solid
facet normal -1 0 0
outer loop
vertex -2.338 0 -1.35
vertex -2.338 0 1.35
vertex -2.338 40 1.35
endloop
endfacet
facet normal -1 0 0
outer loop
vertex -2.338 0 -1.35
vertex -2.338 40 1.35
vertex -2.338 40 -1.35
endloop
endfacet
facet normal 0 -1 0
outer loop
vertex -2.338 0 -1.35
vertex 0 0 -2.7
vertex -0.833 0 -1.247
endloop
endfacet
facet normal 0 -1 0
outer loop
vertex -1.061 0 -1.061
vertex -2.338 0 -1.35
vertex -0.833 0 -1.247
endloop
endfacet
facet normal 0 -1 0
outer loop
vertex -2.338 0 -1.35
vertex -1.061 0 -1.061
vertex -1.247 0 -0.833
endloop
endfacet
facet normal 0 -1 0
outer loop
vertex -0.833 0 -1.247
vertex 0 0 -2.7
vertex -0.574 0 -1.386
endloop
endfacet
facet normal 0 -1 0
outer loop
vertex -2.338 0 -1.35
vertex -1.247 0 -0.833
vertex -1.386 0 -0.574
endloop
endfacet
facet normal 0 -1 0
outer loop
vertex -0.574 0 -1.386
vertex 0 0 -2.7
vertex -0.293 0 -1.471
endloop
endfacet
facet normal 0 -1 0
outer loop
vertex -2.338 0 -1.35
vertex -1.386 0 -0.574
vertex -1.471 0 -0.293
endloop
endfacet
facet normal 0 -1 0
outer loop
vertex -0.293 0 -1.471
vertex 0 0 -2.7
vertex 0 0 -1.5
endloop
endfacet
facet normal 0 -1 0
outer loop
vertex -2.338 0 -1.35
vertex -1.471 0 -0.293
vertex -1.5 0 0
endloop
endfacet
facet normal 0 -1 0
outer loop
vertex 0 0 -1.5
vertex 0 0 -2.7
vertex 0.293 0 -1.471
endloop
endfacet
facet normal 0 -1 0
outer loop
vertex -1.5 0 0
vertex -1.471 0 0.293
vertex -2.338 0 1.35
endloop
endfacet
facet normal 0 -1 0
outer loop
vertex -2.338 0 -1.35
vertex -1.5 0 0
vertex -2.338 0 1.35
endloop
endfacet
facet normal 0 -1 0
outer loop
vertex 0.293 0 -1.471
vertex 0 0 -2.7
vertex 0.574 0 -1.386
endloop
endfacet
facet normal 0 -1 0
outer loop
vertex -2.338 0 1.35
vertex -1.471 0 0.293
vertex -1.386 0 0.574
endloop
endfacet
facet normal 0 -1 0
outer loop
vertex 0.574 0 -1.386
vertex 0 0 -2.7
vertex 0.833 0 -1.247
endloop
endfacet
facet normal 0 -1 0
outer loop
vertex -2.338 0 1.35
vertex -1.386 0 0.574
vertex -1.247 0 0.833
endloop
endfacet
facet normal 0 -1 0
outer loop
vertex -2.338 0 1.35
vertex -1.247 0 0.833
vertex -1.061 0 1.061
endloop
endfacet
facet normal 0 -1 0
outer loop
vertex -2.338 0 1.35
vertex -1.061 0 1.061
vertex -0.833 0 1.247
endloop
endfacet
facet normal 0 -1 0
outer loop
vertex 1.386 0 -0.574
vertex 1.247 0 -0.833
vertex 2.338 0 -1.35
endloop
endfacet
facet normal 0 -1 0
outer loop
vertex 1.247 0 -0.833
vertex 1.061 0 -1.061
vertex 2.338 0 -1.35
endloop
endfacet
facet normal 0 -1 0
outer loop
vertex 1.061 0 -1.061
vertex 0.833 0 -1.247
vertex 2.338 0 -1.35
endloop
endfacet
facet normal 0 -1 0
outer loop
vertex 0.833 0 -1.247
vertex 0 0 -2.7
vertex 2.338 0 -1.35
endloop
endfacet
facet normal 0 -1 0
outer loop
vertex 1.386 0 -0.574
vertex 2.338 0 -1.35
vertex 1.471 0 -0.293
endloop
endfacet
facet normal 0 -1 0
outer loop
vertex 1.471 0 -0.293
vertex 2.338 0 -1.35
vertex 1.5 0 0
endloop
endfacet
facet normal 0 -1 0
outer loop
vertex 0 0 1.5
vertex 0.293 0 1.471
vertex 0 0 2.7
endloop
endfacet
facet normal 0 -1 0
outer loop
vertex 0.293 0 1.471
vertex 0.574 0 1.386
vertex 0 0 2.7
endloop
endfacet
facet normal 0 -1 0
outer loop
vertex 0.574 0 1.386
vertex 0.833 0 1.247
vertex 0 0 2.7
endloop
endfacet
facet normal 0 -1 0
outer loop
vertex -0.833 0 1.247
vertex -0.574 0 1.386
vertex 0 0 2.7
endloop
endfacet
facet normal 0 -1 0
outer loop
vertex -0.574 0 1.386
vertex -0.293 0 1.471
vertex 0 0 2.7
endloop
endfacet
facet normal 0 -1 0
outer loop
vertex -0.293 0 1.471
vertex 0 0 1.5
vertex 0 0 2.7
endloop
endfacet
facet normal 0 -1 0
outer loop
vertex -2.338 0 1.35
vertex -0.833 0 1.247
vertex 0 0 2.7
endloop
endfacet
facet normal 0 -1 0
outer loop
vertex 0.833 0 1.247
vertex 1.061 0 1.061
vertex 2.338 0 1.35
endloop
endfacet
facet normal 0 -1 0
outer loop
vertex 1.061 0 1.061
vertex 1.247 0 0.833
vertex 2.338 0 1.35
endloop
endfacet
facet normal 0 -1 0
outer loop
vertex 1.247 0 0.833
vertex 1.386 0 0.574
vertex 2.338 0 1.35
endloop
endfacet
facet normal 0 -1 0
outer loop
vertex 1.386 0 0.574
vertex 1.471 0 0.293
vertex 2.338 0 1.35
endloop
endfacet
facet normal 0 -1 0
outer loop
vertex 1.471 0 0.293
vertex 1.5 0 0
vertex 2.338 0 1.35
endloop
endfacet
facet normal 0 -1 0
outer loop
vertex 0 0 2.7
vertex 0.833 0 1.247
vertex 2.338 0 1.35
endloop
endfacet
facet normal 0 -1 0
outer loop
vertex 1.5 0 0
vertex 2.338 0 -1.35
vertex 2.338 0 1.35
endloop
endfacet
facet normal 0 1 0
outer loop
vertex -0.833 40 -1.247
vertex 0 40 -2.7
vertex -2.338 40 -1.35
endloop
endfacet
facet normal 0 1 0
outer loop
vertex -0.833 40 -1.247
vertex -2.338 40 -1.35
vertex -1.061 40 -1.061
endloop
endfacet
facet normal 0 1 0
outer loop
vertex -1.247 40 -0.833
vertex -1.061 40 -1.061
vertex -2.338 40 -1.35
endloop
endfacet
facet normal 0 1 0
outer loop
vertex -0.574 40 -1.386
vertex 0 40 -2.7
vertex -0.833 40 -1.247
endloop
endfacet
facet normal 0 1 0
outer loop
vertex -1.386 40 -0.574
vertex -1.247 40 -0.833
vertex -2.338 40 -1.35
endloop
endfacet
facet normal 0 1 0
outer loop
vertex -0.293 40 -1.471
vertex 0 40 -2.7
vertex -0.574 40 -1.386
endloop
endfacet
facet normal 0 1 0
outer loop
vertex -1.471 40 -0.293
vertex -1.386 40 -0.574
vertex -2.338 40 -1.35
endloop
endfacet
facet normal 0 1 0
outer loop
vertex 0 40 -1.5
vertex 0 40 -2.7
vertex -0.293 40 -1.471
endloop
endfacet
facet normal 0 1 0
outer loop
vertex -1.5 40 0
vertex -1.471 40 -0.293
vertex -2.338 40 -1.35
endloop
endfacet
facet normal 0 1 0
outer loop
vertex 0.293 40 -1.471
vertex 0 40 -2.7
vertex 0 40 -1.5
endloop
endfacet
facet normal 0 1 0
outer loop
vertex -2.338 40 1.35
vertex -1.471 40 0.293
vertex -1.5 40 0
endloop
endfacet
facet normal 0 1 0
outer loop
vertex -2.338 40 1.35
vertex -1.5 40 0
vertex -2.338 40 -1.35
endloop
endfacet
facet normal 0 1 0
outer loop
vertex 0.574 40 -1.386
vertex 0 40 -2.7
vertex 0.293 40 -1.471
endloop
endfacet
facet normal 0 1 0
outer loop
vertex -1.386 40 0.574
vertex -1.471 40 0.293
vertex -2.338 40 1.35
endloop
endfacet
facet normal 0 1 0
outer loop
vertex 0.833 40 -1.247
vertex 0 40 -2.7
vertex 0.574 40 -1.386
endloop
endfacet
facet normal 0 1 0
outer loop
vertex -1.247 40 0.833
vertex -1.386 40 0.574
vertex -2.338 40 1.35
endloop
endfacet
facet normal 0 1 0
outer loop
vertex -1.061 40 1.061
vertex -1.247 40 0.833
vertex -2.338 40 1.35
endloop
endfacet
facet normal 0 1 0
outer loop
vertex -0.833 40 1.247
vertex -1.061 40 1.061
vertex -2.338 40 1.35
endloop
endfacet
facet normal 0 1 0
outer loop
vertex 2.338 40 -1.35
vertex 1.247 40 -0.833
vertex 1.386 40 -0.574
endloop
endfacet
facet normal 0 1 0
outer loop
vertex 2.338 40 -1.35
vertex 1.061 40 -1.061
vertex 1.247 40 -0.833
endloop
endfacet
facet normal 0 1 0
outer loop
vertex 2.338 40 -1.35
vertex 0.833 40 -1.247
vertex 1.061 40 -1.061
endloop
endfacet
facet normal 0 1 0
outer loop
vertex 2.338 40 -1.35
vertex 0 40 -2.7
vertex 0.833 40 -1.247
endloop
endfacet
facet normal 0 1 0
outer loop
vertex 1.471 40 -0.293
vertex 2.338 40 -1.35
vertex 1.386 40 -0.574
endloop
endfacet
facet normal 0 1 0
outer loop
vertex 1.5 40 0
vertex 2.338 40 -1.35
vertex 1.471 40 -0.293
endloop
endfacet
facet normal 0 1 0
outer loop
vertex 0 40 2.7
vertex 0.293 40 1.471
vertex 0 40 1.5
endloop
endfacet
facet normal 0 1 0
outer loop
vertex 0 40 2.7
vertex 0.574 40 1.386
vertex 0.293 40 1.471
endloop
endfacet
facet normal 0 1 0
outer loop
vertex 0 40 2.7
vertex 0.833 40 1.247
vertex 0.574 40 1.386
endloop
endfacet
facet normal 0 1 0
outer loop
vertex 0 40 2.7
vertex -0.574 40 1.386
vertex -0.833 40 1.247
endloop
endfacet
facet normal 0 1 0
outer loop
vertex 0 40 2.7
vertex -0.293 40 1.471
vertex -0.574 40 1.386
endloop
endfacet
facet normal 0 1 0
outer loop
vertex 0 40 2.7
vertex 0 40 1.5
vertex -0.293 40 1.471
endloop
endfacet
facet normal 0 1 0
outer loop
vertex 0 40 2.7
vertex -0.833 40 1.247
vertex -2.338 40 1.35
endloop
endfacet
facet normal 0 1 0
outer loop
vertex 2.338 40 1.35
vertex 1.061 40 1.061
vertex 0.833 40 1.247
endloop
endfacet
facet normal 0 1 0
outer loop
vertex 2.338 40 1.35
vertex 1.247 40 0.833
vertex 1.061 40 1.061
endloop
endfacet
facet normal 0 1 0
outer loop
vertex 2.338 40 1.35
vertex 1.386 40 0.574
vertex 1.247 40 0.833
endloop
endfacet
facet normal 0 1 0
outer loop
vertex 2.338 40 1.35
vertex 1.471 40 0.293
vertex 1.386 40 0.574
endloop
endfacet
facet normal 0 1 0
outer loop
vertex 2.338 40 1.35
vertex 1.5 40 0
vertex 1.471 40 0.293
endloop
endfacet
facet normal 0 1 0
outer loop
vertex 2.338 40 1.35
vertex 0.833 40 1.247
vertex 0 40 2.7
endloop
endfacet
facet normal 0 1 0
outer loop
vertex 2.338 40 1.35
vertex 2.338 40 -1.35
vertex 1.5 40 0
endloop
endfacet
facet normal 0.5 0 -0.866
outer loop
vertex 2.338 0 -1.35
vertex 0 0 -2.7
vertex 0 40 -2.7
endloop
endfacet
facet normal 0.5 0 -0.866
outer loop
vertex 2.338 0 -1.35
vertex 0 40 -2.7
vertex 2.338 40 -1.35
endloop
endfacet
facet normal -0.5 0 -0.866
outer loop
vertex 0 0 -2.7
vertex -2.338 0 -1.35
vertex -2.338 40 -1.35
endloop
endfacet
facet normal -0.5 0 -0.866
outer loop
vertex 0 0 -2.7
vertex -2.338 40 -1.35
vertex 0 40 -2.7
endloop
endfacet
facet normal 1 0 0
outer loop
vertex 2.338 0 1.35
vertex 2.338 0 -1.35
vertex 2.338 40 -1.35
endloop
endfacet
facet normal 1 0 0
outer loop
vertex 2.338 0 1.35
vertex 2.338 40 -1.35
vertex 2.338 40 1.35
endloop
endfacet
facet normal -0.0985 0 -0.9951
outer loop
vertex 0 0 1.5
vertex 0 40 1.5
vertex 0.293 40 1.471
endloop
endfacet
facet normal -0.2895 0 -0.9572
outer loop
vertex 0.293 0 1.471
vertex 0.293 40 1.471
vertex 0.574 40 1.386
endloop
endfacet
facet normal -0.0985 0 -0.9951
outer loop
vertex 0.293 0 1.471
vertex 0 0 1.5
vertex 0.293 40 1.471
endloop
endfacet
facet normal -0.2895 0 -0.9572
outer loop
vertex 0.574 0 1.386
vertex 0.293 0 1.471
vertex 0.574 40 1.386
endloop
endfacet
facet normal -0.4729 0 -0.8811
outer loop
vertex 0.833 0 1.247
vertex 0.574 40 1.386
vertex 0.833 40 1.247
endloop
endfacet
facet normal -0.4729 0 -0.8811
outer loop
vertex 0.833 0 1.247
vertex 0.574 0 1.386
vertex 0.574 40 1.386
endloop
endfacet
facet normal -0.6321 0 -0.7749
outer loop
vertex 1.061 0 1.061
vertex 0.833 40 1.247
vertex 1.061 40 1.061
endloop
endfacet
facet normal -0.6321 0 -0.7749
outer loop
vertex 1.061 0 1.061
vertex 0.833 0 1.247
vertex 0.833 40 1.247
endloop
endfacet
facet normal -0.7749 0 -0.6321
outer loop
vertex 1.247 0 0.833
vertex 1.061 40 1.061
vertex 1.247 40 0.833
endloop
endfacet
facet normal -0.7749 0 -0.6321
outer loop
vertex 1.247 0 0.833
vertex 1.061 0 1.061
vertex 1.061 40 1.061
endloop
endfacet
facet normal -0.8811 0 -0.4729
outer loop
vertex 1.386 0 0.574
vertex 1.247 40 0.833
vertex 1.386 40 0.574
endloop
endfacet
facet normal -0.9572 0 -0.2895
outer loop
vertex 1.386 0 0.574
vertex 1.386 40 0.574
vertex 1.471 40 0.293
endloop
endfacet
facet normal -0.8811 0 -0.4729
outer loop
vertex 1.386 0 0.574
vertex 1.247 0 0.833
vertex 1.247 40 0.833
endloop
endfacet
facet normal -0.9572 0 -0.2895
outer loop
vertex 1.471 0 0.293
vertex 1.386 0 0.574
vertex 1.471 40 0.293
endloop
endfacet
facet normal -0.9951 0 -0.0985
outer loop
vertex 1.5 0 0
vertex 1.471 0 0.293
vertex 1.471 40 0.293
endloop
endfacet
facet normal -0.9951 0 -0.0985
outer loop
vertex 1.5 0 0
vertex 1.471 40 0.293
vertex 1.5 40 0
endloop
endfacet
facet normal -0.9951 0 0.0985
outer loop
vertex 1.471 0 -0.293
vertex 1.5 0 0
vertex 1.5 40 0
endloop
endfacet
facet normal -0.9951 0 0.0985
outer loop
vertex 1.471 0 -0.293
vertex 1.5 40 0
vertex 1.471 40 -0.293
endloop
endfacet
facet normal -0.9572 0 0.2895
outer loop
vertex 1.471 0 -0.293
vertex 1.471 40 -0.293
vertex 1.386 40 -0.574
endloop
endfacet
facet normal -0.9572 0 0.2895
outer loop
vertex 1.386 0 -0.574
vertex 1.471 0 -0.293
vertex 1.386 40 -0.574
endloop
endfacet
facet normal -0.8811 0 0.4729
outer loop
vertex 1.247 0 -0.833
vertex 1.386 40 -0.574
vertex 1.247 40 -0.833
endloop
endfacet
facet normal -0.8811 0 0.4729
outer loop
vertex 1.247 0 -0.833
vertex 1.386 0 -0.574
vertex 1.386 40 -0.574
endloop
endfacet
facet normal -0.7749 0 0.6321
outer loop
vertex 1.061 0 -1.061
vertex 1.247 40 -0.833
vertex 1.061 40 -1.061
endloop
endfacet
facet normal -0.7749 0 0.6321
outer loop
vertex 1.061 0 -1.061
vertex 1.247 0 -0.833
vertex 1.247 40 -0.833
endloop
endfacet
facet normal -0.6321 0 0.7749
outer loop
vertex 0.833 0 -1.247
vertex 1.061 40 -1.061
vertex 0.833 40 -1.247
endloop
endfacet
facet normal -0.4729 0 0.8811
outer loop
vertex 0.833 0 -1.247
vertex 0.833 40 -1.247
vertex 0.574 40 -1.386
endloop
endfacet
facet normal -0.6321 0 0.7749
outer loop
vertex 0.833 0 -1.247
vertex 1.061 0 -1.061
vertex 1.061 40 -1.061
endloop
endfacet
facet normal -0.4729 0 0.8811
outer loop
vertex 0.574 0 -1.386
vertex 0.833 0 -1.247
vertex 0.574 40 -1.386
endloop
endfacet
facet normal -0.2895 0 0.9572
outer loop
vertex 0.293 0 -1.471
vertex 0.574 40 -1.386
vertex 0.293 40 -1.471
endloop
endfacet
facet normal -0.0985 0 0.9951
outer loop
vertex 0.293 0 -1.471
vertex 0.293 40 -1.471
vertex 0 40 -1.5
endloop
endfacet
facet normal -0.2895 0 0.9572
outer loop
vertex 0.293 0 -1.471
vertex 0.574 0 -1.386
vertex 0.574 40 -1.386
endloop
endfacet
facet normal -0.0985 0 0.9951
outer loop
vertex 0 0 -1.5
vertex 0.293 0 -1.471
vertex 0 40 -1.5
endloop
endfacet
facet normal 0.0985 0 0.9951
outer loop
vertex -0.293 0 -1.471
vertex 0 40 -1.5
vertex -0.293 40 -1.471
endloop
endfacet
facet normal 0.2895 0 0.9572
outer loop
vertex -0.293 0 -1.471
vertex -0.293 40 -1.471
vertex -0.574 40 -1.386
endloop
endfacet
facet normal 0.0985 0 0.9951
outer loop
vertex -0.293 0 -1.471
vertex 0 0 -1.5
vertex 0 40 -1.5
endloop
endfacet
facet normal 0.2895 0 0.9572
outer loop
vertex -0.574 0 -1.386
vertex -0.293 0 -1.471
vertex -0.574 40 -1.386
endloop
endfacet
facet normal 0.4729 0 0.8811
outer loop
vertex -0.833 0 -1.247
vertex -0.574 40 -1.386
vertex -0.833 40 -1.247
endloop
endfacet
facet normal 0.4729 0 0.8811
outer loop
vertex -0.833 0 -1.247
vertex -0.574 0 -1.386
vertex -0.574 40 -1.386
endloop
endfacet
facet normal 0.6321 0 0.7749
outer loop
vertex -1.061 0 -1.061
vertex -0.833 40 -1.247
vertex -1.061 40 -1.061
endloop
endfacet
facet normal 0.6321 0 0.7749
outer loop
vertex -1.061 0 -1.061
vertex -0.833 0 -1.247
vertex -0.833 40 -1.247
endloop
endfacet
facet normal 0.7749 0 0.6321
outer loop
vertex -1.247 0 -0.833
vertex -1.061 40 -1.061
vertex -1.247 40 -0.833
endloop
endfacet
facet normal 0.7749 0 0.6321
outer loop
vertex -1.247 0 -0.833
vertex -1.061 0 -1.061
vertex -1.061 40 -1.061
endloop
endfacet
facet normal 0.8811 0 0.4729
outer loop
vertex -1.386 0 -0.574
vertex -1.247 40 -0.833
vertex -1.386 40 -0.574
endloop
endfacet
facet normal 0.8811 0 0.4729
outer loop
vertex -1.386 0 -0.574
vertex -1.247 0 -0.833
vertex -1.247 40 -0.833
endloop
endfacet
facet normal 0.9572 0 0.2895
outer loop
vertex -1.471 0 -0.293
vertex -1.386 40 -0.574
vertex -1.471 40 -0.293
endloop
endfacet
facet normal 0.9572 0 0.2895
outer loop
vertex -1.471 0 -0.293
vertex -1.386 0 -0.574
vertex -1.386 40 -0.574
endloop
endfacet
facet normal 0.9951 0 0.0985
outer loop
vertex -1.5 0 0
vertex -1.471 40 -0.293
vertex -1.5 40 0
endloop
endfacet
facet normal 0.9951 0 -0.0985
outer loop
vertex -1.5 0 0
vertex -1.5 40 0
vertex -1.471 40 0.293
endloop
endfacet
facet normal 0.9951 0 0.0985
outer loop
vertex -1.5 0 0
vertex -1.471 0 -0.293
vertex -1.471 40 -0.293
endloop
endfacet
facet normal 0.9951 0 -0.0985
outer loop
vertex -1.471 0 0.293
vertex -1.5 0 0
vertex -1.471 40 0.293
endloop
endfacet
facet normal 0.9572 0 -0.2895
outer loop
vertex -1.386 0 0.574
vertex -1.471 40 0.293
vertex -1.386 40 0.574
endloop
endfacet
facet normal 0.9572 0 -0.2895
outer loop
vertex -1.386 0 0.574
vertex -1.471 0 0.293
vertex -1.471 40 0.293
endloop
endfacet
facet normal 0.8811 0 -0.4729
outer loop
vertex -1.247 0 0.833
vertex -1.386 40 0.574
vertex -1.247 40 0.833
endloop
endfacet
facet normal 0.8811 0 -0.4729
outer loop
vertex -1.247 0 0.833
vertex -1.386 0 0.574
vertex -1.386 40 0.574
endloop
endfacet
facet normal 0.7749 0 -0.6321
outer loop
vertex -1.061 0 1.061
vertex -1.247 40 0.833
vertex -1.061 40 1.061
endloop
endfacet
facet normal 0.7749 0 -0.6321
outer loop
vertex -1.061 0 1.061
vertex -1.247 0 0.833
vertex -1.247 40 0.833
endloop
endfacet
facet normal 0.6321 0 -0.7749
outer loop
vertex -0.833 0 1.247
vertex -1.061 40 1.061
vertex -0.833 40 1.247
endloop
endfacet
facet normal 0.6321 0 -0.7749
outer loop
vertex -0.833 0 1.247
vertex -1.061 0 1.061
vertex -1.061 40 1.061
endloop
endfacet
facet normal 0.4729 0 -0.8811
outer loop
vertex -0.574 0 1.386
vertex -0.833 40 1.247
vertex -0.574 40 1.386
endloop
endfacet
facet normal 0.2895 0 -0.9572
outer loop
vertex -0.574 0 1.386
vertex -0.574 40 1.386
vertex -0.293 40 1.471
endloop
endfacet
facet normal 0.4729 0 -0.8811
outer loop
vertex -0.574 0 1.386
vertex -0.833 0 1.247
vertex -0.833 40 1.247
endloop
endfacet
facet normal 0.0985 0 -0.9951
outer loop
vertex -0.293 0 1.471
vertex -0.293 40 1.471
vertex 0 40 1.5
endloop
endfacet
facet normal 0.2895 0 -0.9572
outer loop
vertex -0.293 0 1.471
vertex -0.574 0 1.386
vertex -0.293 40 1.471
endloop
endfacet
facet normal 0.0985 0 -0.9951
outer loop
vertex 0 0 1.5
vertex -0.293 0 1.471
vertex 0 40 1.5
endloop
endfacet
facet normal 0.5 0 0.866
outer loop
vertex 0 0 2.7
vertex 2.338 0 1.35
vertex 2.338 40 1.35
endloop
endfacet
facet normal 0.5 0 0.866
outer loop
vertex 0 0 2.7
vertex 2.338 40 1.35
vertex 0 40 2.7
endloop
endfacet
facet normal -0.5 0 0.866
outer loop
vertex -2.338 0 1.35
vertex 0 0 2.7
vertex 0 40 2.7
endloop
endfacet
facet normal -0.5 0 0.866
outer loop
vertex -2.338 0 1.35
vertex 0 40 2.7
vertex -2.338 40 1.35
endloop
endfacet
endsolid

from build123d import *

# Parameters (mm, degrees)
SKETCH_1_R          = 2.7
SKETCH_1_R_2        = 1.5
EXTRUDE_1_DEPTH     = 40
CUT_EXTRUDE_START   = -40
CUT_EXTRUDE_1_DEPTH = 40


with BuildPart() as part:
    # 草图1 → 凸台-拉伸1 (new body)
    with BuildSketch(Plane(origin=(0, 0, 0), x_dir=(1, 0, 0), z_dir=(0, 1, 0))):
        with Locations(Location((0, 0, 0), (0, 0, 270))):
            Circle(SKETCH_1_R)
        with Locations(Location((0, 0, 0), (0, 0, 270))):
            Circle(SKETCH_1_R_2, mode=Mode.SUBTRACT)
    extrude(amount=EXTRUDE_1_DEPTH)

    # 草图2 → 切除-拉伸1 (cut)
    with BuildSketch(Plane(origin=(0, 40, 0), x_dir=(1, 0, 0), z_dir=(0, 1, 0)).offset(CUT_EXTRUDE_START)):
        with BuildLine():
            Line((-2.33826859, 1.35), (0, 2.7))
            ThreePointArc((0, 2.7), (-1.35, 2.33826859), (-2.33826859, 1.35))
        make_face()
        with BuildLine():
            Line((-2.33826859, -1.35), (-2.33826859, 1.35))
            ThreePointArc((-2.33826859, 1.35), (-2.7, 0), (-2.33826859, -1.35))
        make_face()
        with BuildLine():
            Line((0, -2.7), (-2.33826859, -1.35))
            ThreePointArc((-2.33826859, -1.35), (-1.35, -2.33826859), (0, -2.7))
        make_face()
        with BuildLine():
            ThreePointArc((0, -2.7), (1.35, -2.33826859), (2.33826859, -1.35))
            Line((2.33826859, -1.35), (0, -2.7))
        make_face()
        with BuildLine():
            ThreePointArc((2.7, 0), (2.607999731, 0.698811422), (2.33826859, 1.35))
            Line((2.33826859, 1.35), (2.33826859, -1.35))
            ThreePointArc((2.33826859, -1.35), (2.607999731, -0.698811422), (2.7, 0))
        make_face()
        with BuildLine():
            ThreePointArc((2.33826859, 1.35), (1.35, 2.33826859), (0, 2.7))
            Line((0, 2.7), (2.33826859, 1.35))
        make_face()
    extrude(amount=CUT_EXTRUDE_1_DEPTH, mode=Mode.SUBTRACT)


solid = part.part
